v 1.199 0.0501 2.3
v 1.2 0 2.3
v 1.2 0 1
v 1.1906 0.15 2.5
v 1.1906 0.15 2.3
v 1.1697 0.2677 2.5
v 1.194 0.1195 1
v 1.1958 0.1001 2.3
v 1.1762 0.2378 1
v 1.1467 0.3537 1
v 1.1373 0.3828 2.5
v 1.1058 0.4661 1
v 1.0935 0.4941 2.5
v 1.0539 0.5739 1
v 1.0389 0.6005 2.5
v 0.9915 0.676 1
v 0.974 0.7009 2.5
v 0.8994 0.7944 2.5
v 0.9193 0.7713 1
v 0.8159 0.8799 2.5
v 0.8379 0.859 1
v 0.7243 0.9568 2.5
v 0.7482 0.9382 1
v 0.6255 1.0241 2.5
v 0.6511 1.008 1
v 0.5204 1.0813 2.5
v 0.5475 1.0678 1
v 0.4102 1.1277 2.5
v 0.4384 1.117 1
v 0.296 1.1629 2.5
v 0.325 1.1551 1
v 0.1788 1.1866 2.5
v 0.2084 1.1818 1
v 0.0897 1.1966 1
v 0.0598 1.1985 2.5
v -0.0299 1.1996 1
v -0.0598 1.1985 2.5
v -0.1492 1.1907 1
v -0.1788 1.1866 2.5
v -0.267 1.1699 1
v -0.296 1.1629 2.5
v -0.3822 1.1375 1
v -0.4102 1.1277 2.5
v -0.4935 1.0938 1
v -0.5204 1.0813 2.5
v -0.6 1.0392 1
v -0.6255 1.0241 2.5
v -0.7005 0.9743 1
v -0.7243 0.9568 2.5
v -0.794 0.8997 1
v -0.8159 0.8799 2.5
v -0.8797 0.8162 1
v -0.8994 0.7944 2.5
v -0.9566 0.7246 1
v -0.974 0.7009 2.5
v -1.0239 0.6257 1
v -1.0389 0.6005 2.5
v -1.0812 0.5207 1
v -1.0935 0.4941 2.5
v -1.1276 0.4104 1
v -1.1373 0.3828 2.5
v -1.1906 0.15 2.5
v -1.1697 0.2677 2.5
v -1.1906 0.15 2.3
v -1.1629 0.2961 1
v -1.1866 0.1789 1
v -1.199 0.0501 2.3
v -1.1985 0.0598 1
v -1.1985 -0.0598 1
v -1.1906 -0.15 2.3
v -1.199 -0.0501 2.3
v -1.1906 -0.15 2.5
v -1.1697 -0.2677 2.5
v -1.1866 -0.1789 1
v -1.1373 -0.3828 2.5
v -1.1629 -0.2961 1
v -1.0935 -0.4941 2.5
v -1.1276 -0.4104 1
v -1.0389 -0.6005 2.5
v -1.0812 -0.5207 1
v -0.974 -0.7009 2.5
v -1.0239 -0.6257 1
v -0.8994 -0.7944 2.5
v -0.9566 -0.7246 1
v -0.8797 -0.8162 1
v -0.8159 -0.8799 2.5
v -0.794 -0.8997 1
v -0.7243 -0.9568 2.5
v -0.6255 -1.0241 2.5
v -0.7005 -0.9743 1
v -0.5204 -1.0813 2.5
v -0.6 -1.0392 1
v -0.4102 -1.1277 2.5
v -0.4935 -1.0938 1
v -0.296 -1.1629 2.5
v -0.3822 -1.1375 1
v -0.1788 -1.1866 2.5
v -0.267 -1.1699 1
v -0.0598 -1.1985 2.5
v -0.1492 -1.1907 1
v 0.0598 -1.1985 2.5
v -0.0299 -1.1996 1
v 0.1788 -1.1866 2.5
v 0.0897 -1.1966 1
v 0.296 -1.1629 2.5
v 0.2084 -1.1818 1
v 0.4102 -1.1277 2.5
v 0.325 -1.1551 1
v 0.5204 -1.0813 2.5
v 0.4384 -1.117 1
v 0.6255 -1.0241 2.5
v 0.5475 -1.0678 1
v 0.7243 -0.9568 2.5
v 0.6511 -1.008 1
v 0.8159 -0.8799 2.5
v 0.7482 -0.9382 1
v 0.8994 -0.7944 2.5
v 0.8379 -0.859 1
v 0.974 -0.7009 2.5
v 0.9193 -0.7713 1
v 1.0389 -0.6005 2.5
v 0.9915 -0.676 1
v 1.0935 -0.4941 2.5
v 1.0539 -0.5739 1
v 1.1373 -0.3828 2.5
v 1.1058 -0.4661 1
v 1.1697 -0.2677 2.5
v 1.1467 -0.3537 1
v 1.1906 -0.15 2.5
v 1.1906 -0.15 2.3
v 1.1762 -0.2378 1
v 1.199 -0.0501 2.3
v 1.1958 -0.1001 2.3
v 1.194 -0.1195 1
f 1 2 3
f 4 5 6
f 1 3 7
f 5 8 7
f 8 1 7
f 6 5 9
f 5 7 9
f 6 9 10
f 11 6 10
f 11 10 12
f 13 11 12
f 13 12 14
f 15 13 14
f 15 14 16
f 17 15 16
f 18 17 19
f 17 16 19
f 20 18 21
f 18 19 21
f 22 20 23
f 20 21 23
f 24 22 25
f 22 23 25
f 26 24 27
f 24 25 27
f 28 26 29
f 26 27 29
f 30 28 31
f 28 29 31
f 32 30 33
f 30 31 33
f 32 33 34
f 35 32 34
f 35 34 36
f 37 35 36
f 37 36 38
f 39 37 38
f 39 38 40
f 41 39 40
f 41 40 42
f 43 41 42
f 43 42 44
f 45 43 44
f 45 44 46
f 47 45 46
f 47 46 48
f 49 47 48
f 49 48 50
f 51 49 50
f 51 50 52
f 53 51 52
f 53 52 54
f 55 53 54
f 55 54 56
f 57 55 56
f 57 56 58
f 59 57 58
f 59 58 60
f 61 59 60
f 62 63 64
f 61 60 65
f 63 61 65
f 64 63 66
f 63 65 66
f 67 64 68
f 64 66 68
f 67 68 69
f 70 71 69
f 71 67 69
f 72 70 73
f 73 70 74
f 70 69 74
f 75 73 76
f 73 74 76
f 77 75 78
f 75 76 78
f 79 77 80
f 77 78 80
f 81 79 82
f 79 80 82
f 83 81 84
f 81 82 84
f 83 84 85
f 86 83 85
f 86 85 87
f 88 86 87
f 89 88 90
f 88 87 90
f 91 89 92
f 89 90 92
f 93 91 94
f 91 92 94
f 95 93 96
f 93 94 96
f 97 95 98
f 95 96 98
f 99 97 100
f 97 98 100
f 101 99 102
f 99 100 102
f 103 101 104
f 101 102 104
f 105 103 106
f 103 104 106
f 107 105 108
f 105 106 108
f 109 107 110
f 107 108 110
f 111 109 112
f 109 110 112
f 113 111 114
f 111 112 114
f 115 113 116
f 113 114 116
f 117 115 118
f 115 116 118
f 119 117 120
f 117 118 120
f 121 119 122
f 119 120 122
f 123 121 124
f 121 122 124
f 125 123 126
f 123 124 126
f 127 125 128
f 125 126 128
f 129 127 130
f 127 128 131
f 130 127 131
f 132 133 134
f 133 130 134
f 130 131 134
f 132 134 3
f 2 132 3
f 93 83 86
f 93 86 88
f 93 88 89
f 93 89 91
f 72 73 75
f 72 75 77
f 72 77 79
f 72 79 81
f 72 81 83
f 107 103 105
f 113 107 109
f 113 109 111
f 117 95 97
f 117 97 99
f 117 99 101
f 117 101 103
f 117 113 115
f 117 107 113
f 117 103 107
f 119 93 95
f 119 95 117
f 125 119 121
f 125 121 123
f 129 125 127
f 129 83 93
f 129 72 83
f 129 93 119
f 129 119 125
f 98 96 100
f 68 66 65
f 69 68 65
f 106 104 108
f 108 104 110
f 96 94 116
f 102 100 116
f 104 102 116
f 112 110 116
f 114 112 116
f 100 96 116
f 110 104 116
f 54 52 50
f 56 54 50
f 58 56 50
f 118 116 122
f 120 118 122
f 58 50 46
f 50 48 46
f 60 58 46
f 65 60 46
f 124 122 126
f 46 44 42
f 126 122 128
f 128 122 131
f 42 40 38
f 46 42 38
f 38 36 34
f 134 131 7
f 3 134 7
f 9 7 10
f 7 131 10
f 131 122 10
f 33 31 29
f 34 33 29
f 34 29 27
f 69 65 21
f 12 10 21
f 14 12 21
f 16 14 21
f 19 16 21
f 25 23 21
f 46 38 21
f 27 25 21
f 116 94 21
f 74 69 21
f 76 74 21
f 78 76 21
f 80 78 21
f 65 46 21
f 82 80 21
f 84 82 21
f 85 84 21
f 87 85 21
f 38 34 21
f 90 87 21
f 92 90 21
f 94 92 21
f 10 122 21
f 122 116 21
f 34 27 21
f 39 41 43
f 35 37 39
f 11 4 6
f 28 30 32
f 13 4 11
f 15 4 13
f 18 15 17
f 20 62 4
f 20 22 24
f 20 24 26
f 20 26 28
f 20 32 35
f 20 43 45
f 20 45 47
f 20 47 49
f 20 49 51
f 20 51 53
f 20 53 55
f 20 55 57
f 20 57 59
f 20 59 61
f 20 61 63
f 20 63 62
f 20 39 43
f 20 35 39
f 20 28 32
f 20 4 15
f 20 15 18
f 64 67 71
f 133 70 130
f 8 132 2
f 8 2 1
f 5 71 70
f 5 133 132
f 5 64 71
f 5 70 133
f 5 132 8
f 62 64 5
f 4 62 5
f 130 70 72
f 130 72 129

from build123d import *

# Parameters (mm, degrees)
BOX023_W          = 2.4
BOX023_H          = 0.3
BOX023_DEPTH      = 0.3
CYLINDER002_R     = 1.2
CYLINDER002_DEPTH = 1.5


with BuildPart() as kub023:
    # Box023 → Box023 (new body)
    with BuildSketch(Plane(origin=(-1.2, -0.15, 2.3), x_dir=(1, 0, 0), z_dir=(0, 0, 1))):
        with Locations((1.2, 0.15)):
            Rectangle(BOX023_W, BOX023_H)
    extrude(amount=BOX023_DEPTH)


with BuildPart() as cut016:
    # Cylinder002 → Cylinder002 (new body)
    with BuildSketch(Plane.XY.offset(1)):
        Circle(CYLINDER002_R)
    extrude(amount=CYLINDER002_DEPTH)

    # Cut016: cut Kub023
    add(kub023.part, mode=Mode.SUBTRACT)


solid = cut016.part
